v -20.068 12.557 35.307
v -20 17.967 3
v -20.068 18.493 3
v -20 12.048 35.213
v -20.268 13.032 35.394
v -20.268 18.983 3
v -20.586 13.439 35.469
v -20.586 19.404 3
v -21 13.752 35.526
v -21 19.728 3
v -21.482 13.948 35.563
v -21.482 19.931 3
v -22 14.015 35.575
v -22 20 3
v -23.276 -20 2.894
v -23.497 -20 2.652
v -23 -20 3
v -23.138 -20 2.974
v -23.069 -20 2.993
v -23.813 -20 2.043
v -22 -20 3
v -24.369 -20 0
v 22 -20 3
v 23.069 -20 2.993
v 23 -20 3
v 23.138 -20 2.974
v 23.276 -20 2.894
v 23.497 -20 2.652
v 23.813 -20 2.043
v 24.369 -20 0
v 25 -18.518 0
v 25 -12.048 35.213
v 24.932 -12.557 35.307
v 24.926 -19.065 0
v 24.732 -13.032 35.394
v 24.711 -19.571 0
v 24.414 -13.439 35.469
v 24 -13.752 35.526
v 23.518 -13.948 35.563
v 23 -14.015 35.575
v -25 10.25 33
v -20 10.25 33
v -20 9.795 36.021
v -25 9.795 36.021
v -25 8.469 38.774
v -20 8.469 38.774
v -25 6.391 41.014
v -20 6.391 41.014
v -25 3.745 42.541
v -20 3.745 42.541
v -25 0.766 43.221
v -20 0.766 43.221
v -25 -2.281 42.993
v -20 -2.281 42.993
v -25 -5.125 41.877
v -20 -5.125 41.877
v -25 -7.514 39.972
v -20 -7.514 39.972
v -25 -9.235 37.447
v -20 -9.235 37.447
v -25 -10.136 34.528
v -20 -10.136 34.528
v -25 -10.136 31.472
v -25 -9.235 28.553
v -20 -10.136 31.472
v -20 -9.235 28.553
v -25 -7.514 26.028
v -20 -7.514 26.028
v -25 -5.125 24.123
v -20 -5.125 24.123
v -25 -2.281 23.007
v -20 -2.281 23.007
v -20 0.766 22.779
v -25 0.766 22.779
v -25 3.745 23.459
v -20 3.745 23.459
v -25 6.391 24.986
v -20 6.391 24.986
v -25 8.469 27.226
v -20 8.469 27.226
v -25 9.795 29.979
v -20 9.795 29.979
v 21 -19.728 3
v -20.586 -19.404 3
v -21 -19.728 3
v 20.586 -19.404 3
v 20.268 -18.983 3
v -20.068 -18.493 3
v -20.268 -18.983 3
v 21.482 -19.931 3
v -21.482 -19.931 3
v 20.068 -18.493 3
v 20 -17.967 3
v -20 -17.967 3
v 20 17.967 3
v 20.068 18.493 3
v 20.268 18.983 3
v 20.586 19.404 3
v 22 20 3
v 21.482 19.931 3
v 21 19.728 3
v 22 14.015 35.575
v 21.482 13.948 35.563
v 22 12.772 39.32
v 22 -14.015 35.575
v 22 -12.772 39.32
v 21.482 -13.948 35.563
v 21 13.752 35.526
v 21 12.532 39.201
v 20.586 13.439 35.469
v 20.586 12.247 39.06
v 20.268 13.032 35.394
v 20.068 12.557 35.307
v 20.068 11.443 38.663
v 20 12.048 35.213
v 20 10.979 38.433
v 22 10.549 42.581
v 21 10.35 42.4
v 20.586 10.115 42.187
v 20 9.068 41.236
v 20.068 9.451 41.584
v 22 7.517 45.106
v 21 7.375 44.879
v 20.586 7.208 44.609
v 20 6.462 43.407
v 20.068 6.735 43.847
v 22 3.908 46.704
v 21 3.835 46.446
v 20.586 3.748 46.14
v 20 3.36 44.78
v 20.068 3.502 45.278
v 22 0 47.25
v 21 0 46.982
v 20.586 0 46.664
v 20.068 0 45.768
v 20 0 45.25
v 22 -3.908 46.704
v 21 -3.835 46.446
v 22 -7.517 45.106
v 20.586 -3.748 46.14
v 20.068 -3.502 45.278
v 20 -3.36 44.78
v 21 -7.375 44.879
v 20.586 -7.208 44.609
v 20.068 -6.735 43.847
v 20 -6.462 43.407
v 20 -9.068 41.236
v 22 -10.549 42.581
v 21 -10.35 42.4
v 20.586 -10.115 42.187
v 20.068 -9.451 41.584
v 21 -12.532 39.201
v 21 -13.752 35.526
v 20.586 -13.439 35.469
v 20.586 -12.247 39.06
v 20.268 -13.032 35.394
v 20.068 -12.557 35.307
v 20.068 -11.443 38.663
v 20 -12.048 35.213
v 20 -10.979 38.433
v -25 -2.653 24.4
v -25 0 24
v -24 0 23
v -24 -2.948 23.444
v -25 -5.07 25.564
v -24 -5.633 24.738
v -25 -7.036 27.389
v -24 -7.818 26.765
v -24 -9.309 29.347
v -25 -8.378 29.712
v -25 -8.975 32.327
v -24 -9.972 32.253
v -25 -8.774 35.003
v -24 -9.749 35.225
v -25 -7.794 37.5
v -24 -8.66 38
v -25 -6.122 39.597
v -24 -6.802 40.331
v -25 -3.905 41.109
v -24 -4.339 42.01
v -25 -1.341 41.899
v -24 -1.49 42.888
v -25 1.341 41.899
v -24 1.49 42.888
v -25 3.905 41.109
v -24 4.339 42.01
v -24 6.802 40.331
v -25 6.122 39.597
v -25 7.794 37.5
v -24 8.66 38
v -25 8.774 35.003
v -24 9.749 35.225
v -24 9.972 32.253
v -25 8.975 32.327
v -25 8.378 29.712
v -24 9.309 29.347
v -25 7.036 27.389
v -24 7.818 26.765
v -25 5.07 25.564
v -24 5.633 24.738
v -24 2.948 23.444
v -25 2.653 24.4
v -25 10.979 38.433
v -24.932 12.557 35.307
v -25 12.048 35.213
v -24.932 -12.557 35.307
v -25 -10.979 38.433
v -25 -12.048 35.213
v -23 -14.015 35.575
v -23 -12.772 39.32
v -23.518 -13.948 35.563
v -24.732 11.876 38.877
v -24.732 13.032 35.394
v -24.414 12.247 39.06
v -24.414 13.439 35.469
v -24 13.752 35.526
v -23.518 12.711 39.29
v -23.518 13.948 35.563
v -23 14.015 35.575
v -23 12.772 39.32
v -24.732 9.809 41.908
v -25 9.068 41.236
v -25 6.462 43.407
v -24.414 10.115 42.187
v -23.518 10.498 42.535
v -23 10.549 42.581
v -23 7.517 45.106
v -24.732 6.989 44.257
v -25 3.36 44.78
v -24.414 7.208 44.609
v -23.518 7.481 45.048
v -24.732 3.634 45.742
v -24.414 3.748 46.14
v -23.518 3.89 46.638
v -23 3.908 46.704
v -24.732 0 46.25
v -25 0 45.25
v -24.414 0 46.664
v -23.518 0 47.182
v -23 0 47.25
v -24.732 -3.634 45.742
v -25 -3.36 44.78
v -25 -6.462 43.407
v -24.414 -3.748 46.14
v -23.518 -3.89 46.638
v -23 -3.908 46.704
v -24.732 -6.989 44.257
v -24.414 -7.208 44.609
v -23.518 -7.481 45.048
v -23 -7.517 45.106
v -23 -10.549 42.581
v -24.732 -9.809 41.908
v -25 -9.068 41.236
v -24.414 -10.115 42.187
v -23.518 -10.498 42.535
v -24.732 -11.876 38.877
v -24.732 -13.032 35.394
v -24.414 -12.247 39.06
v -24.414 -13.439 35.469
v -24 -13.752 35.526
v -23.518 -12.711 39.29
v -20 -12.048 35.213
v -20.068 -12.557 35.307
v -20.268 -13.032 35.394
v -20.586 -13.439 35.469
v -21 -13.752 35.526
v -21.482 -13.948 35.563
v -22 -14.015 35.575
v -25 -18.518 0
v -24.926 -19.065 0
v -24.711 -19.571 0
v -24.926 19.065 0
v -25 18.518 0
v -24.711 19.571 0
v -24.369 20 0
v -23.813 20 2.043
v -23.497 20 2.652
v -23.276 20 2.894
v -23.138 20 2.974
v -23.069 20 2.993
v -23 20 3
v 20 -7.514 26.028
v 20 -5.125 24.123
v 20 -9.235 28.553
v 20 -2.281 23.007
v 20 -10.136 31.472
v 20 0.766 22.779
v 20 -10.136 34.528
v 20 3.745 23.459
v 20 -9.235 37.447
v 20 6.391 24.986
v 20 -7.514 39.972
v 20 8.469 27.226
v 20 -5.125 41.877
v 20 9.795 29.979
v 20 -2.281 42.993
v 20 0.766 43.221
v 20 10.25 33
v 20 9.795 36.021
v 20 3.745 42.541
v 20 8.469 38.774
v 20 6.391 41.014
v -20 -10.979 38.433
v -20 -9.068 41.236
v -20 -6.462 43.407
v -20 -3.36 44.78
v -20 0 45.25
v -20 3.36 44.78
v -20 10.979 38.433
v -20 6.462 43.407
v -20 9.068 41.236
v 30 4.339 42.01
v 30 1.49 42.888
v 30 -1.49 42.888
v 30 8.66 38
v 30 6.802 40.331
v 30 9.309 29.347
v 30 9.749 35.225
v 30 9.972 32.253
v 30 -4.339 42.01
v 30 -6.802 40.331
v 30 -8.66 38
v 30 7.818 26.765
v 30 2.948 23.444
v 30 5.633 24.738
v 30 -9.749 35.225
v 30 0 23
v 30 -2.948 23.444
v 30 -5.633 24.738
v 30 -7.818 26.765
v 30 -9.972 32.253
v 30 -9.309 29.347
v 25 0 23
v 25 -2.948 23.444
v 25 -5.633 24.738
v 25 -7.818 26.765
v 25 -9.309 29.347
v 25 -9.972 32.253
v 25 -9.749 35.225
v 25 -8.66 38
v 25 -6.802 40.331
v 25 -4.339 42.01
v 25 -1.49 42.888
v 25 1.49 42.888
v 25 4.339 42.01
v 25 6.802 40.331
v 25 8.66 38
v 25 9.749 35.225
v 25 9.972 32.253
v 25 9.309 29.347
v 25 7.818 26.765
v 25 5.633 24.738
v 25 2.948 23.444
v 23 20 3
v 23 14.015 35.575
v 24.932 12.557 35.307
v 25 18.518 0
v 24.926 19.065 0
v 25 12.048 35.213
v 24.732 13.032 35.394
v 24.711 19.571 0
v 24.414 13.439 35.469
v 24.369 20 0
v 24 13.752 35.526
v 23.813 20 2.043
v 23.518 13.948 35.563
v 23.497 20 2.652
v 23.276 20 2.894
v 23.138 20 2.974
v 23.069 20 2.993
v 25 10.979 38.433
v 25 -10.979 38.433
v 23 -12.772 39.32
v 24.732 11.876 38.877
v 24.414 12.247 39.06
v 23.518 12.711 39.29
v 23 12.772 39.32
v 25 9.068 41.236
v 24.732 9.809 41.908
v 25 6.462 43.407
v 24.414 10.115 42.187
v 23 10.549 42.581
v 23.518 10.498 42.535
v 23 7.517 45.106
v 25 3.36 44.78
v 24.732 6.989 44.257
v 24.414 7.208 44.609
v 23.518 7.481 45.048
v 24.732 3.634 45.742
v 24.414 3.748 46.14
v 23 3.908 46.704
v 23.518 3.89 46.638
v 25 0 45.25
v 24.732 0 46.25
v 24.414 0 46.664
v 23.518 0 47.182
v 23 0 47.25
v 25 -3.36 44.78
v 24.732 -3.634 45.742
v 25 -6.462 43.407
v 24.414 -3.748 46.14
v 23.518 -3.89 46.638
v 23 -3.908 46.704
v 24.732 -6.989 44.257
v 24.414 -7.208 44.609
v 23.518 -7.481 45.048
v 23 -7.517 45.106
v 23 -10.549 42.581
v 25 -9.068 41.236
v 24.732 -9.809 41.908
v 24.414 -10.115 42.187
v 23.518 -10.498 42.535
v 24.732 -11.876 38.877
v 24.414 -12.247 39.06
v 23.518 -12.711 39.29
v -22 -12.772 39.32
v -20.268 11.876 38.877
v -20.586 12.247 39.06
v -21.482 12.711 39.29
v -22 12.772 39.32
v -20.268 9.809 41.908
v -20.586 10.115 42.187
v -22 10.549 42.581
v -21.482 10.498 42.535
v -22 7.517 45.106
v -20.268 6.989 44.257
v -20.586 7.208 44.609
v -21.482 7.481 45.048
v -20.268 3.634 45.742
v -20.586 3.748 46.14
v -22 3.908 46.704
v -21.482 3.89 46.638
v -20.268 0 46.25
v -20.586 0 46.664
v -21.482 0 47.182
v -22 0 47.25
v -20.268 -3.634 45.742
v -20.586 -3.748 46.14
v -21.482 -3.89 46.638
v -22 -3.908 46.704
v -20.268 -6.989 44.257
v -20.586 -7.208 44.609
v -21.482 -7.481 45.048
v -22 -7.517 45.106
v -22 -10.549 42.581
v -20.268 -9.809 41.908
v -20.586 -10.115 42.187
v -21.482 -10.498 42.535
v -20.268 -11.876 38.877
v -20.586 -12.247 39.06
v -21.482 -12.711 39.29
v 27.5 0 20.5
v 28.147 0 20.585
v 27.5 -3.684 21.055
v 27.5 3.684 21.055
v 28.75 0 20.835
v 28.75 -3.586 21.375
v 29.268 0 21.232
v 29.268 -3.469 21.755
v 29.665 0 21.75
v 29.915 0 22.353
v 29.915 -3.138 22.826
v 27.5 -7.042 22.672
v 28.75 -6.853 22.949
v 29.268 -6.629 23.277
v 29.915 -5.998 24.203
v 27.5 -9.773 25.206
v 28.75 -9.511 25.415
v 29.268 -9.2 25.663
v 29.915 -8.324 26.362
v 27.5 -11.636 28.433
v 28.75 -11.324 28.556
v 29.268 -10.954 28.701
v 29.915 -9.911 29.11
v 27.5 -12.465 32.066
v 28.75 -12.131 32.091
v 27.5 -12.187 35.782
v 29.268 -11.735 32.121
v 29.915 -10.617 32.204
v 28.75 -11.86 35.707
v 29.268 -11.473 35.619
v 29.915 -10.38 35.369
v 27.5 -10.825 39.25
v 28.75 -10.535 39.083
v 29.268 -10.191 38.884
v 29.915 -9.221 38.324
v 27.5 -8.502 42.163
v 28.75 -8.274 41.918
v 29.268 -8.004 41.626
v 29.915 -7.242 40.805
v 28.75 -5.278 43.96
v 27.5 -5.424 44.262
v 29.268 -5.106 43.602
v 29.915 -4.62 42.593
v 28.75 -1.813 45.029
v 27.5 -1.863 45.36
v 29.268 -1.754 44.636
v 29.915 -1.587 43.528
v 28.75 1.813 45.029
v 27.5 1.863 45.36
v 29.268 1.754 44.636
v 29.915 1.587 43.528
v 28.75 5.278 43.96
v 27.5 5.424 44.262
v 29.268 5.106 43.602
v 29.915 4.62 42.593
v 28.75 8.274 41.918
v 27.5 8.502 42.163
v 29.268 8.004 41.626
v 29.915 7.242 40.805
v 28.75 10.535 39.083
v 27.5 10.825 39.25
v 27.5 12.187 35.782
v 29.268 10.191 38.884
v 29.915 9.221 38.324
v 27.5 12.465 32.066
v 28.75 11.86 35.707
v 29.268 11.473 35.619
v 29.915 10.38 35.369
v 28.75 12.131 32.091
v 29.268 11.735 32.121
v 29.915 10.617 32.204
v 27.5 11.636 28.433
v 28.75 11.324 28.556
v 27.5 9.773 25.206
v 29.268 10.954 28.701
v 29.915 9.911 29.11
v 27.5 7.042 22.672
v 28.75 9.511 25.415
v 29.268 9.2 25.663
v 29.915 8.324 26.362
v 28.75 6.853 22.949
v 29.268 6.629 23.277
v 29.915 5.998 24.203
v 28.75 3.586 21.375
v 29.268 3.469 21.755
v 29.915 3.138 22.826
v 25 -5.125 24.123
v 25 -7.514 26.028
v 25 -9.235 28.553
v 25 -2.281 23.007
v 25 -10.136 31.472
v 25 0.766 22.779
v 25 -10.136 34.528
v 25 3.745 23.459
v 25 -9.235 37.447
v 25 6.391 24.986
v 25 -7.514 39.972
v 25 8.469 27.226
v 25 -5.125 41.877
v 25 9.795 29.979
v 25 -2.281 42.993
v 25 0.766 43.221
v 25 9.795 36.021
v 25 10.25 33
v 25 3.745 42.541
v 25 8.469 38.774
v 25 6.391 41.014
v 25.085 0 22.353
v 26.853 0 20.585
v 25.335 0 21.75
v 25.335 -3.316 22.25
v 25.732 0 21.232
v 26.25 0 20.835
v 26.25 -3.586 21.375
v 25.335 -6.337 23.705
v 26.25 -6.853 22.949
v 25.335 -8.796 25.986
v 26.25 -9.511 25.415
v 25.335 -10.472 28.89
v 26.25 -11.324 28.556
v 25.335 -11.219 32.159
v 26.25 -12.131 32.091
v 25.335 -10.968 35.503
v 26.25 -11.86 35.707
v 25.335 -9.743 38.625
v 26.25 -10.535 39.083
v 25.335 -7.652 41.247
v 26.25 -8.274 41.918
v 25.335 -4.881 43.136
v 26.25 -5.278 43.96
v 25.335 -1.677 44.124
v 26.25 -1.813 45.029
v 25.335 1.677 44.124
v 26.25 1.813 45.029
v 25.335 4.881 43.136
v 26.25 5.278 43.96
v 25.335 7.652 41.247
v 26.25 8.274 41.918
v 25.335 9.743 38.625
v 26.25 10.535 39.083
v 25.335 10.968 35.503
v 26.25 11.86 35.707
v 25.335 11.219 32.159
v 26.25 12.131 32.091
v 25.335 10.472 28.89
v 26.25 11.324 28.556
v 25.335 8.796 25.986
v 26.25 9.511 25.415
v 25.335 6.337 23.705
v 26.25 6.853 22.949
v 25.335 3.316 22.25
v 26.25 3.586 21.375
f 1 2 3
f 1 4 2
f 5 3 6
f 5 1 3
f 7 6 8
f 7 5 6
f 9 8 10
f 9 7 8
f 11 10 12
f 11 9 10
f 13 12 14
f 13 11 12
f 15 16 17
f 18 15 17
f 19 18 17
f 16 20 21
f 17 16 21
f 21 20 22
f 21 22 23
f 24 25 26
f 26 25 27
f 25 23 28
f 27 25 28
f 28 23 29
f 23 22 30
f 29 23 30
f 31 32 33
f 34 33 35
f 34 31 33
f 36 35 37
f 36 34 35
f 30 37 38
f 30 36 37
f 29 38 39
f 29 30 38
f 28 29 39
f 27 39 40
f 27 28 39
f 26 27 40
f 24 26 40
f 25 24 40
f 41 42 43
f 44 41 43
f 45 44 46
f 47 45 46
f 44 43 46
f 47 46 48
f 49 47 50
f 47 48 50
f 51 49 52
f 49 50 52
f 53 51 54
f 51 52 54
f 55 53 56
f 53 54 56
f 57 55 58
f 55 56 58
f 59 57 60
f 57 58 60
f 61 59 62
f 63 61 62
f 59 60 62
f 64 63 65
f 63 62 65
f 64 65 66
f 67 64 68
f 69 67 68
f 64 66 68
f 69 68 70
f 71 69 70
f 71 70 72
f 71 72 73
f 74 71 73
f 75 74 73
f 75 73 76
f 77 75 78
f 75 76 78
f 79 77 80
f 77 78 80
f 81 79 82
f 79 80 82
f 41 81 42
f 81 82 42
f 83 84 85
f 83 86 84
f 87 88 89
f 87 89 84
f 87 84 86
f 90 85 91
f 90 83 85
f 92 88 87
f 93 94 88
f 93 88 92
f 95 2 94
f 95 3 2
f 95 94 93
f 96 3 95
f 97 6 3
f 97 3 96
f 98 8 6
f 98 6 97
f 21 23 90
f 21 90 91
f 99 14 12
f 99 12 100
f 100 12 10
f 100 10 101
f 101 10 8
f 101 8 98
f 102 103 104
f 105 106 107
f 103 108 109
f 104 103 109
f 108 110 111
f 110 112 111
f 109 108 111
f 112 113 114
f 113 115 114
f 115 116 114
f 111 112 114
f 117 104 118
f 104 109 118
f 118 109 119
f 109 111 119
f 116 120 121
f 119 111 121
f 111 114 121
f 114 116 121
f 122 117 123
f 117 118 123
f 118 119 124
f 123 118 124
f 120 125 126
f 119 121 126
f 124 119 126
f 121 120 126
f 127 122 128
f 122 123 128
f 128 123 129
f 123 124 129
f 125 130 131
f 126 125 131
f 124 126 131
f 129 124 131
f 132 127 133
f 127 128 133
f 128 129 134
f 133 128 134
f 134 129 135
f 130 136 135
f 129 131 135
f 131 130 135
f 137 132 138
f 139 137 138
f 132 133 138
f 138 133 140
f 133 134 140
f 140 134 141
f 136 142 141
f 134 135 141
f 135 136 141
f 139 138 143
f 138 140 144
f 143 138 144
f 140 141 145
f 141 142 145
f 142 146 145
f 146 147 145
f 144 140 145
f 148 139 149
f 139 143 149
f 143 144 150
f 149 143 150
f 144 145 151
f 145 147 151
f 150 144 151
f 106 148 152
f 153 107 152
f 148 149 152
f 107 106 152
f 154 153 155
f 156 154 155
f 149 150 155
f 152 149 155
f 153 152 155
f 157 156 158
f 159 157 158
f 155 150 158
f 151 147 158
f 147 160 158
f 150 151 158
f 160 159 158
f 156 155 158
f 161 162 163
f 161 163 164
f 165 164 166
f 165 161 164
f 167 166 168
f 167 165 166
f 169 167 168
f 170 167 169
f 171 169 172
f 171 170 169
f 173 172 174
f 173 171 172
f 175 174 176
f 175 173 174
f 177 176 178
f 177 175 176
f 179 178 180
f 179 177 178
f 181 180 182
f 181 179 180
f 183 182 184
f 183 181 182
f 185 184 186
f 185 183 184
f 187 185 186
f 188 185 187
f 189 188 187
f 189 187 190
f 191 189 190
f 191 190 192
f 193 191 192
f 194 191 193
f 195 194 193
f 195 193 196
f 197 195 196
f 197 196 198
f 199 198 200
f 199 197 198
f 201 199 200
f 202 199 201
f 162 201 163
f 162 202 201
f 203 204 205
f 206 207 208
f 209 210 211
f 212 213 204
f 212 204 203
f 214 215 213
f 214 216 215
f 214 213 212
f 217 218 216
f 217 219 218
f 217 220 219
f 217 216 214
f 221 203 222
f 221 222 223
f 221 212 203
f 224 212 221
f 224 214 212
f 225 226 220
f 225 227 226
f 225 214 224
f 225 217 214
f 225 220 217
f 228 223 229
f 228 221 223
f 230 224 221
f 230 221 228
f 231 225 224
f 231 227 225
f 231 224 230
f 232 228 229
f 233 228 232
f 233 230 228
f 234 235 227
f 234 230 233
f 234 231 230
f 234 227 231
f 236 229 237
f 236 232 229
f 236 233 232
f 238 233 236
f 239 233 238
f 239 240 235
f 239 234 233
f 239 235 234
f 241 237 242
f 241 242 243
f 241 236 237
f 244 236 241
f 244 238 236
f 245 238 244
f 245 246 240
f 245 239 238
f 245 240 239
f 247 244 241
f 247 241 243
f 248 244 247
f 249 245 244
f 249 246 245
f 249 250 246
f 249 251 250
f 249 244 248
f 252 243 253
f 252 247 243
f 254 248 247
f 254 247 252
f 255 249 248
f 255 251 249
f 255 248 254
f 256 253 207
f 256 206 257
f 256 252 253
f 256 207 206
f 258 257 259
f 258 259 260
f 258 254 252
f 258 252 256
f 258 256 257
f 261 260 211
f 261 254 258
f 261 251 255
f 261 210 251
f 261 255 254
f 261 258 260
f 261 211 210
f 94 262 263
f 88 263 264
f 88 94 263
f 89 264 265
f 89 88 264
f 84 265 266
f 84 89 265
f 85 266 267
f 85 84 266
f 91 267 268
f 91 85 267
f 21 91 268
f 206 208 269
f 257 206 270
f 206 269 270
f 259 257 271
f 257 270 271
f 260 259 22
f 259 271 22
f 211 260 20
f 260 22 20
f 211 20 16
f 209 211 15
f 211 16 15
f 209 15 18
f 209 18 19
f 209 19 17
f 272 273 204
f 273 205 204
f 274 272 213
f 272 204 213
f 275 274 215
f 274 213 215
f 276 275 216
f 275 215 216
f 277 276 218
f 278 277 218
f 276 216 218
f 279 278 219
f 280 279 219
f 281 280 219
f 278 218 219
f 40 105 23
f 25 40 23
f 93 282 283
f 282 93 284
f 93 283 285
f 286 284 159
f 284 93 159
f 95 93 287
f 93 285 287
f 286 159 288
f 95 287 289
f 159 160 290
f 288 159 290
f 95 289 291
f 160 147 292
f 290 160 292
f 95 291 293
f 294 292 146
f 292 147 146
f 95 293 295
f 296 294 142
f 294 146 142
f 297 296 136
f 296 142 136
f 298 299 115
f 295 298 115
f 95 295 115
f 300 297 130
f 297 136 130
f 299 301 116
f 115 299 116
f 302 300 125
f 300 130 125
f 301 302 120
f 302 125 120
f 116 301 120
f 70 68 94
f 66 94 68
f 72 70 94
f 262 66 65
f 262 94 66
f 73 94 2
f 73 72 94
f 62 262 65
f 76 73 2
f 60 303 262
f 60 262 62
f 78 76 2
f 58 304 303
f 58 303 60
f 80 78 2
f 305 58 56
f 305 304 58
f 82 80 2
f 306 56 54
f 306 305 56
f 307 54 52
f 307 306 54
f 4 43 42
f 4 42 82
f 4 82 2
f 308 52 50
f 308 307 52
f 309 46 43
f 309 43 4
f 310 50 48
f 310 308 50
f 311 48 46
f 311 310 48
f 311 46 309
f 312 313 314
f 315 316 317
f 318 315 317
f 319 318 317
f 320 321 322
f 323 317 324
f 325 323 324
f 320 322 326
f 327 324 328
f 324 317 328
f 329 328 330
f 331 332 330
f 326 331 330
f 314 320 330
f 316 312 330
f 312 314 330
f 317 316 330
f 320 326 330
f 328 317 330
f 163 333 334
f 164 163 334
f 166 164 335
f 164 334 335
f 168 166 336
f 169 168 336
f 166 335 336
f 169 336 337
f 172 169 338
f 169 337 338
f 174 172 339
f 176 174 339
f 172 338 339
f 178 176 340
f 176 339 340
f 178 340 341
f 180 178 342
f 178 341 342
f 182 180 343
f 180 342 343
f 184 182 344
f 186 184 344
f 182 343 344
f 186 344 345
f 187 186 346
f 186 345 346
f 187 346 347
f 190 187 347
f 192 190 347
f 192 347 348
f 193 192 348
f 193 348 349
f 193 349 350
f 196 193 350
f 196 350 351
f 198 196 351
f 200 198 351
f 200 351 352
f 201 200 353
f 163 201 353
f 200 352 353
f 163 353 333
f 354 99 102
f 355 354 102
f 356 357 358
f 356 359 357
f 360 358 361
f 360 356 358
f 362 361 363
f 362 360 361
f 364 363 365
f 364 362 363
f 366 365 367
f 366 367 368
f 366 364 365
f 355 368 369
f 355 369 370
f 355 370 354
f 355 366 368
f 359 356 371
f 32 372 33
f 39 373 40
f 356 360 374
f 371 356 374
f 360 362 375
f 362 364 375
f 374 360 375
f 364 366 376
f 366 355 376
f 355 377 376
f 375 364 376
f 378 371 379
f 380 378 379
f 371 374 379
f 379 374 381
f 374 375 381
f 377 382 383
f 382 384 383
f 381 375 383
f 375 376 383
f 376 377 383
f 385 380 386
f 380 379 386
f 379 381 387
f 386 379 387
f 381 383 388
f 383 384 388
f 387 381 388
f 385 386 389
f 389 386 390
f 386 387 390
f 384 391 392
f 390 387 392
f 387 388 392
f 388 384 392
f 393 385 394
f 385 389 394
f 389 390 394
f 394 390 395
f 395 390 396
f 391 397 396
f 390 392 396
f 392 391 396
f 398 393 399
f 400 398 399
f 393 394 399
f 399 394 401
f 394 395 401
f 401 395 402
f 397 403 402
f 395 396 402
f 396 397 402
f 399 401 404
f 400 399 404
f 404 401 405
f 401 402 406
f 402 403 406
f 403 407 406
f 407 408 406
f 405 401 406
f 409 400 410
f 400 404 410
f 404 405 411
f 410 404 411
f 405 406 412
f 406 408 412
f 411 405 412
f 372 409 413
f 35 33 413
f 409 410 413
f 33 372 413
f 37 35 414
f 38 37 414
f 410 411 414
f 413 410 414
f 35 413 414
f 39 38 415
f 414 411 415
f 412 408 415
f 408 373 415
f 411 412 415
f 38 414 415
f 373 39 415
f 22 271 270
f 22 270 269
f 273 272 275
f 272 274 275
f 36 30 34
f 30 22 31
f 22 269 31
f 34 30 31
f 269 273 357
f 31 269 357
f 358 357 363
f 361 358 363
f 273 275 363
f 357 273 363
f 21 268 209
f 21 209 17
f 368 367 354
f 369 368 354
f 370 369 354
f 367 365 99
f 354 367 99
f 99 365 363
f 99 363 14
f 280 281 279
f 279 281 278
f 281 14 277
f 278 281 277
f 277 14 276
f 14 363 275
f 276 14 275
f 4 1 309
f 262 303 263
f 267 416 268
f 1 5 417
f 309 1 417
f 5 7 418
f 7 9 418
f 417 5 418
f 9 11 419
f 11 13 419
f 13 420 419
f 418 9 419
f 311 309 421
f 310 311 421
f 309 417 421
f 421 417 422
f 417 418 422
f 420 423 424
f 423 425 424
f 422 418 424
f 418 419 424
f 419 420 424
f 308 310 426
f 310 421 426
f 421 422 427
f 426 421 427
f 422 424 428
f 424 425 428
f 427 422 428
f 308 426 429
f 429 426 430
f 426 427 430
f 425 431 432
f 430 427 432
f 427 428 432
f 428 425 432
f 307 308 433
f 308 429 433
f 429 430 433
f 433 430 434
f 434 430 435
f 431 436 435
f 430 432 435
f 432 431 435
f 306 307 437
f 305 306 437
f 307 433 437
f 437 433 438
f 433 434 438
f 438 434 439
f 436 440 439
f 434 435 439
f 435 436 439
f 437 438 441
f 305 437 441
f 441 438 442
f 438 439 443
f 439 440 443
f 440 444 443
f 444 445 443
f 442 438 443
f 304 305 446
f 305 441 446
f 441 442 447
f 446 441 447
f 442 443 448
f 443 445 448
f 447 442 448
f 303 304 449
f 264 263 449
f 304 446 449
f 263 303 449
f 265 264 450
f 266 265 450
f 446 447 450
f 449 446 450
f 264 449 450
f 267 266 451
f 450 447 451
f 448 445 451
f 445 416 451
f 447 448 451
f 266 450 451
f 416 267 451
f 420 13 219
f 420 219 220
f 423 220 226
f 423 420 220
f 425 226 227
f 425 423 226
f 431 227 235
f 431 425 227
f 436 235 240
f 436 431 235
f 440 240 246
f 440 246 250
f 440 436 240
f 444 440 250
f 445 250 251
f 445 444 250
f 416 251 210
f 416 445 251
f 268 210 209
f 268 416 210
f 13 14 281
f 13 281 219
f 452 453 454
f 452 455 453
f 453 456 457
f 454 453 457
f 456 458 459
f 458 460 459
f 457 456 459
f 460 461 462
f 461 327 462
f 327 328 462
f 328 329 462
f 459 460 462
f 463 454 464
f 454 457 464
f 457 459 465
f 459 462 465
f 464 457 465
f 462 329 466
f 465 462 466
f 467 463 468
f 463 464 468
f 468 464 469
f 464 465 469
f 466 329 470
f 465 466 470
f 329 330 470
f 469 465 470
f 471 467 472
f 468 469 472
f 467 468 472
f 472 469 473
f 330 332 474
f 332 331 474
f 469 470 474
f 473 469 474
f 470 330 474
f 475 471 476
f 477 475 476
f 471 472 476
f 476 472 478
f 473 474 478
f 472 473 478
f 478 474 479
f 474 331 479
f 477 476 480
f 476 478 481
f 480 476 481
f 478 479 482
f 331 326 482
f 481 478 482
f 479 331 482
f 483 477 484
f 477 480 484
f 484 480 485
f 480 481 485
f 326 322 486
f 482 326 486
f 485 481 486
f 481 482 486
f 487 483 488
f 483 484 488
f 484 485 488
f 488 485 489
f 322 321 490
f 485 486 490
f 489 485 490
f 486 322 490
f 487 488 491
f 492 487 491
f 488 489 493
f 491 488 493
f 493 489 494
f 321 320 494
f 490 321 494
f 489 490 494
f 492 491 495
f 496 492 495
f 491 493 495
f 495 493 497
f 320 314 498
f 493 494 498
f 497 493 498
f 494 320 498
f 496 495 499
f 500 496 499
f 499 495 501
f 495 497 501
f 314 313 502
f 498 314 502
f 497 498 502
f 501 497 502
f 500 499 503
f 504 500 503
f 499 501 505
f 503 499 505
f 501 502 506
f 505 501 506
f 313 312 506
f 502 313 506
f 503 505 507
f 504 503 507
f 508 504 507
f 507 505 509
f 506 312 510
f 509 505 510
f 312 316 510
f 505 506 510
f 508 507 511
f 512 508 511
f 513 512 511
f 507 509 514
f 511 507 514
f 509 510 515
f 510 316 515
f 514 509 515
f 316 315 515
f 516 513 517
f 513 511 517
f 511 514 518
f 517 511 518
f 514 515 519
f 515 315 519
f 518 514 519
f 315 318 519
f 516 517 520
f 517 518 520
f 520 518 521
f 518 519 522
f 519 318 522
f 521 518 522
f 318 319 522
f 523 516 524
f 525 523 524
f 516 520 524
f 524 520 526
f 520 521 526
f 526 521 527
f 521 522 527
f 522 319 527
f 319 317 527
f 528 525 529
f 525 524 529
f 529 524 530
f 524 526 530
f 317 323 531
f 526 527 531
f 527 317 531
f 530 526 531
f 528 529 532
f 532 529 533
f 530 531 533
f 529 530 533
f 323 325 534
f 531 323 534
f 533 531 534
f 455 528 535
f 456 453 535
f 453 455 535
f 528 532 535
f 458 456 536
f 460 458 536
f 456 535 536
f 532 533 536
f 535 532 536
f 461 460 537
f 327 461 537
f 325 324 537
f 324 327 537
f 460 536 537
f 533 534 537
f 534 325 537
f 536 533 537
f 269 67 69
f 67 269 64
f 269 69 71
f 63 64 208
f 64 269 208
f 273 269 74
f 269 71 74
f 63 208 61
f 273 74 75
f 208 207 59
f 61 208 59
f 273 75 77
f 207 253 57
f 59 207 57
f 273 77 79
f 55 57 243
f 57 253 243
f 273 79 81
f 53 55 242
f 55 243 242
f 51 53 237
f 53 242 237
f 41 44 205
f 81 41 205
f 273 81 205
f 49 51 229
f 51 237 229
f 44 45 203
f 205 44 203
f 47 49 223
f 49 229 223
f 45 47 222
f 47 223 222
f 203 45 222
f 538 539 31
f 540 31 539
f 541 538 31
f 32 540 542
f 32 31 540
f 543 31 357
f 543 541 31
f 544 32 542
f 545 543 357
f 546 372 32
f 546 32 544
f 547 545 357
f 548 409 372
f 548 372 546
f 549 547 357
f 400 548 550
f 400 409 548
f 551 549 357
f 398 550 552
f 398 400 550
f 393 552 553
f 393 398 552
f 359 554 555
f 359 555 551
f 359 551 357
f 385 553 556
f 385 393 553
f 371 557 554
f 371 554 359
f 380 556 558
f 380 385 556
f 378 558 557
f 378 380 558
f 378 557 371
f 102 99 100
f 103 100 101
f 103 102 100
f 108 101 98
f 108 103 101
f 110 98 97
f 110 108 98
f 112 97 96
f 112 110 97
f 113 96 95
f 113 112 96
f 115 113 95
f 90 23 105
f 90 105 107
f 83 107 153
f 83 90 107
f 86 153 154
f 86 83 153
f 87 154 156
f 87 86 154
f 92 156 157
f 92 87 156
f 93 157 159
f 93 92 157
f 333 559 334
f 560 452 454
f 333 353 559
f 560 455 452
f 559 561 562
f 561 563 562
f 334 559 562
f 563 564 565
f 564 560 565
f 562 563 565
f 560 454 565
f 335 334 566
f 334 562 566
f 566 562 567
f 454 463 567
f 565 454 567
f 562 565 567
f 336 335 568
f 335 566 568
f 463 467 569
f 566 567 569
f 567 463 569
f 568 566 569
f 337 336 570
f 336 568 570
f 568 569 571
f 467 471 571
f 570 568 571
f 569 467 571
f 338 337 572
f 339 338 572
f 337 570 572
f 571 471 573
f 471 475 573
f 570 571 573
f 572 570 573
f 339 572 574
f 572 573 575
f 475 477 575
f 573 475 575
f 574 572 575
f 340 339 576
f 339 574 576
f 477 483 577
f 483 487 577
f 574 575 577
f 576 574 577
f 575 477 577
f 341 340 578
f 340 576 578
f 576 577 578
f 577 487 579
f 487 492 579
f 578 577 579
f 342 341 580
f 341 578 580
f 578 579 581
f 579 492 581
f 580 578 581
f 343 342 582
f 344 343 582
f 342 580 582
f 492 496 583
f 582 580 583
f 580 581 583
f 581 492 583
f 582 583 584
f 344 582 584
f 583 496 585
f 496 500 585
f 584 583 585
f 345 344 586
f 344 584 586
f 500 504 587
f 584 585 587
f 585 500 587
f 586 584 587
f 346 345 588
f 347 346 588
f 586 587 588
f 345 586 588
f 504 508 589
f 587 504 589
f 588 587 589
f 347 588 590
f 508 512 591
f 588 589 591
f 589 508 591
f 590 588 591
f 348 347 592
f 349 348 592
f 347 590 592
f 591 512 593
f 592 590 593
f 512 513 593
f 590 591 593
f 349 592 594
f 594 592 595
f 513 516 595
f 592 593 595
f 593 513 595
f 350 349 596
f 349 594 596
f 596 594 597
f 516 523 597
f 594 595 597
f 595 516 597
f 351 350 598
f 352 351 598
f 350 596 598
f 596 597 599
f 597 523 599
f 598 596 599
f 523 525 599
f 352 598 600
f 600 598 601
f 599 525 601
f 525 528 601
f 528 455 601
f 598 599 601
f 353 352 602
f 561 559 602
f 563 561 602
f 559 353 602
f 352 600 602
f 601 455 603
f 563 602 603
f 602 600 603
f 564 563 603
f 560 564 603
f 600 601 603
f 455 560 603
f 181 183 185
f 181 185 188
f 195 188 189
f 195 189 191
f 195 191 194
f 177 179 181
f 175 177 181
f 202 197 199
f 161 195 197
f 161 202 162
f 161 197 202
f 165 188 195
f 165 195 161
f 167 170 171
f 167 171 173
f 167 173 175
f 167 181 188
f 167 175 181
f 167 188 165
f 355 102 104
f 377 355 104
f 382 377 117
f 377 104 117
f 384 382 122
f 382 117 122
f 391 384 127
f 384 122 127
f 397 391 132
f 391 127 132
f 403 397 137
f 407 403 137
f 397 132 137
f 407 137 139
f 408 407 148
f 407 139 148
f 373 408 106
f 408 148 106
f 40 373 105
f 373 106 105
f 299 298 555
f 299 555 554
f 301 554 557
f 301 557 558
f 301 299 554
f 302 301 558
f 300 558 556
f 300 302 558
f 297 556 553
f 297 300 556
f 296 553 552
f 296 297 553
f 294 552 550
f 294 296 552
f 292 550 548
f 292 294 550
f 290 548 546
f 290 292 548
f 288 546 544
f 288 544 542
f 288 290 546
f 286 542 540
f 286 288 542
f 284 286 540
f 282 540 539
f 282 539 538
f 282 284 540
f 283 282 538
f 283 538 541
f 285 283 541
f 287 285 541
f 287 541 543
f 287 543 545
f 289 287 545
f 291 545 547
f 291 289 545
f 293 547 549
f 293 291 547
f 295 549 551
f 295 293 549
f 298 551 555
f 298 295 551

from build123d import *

# Parameters (mm, degrees)
F0_W     = 40
F0_H     = 40
F0_W_2   = 5
F1_DEPTH = 3
F3_START = 20
F2_R     = 10.25
F3_DEPTH = 5
F4_START = -20
F4_DEPTH = 5
F5_W     = 50
F5_H     = 10
F7_R     = 2
F8_R     = 2.49999
F9_SIZE  = 1


# Not quite as in the source:
# - a fillet or chamfer is up to 0.001 mm smaller than in the source, because OpenCascade refuses the exact size


with BuildPart() as f1:
    # F0 (on Top) → F1 (new body)
    with BuildSketch(Plane.XY):
        Rectangle(F0_W, F0_H)
        with Locations((-22.5, 0)):
            Rectangle(F0_W_2, F0_H)
        with Locations((22.5, 0)):
            Rectangle(F0_W_2, F0_H)
    extrude(amount=F1_DEPTH)

    # F2 (on Right) → F3 (join)
    with BuildSketch(Plane.YZ.offset(F3_START)):
        with BuildLine():
            ThreePointArc((14.0154384668, 35.5748756445), (14.1912384617, 34.2927687049), (14.25, 33))
            ThreePointArc((14.25, 33), (-1.2927687049, 18.8087615383), (-14.0154384668, 35.5748756445))
            Line((-14.0154384668, 35.5748756445), (-20, 3))
            Line((-20, 3), (20, 3))
            Line((20, 3), (14.0154384668, 35.5748756445))
        make_face()
        with BuildLine():
            ThreePointArc((-14.0154384668, 35.5748756445), (-1.2927687049, 18.8087615383), (14.25, 33))
            ThreePointArc((14.25, 33), (14.1912384617, 34.2927687049), (14.0154384668, 35.5748756445))
            ThreePointArc((14.0154384668, 35.5748756445), (0, 47.25), (-14.0154384668, 35.5748756445))
        make_face()
        with Locations((0, 33)):
            Circle(F2_R, mode=Mode.SUBTRACT)
    extrude(amount=F3_DEPTH)

    # F2 (on Right) → F4 (join)
    with BuildSketch(Plane.YZ.offset(F4_START)):
        with BuildLine():
            ThreePointArc((14.0154384668, 35.5748756445), (14.1912384617, 34.2927687049), (14.25, 33))
            ThreePointArc((14.25, 33), (-1.2927687049, 18.8087615383), (-14.0154384668, 35.5748756445))
            Line((-14.0154384668, 35.5748756445), (-20, 3))
            Line((-20, 3), (20, 3))
            Line((20, 3), (14.0154384668, 35.5748756445))
        make_face()
        with BuildLine():
            ThreePointArc((-14.0154384668, 35.5748756445), (-1.2927687049, 18.8087615383), (14.25, 33))
            ThreePointArc((14.25, 33), (14.1912384617, 34.2927687049), (14.0154384668, 35.5748756445))
            ThreePointArc((14.0154384668, 35.5748756445), (0, 47.25), (-14.0154384668, 35.5748756445))
        make_face()
        with Locations((0, 33)):
            Circle(F2_R, mode=Mode.SUBTRACT)
    extrude(amount=-F4_DEPTH)

    # F7
    f7_edges = [f1.edges().sort_by_distance(p)[0] for p in [
        (-20, 17.007719, 19.287438),
        (-25, 17.007719, 19.287438),
        (20, 17.007719, 19.287438),
        (25, 17.007719, 19.287438),
    ]]
    fillet(f7_edges, radius=F7_R)


with BuildPart() as f6:
    # F5 (on Front) → F6 (revolve)
    with BuildSketch(Plane.XZ):
        with Locations((0, 28)):
            Rectangle(F5_W, F5_H)
        Polygon((25, 33), (25, 23), (25, 20.5), (30, 20.5), (30, 33), align=None)
    revolve(axis=Axis((0, 0, 33), (-1, 0, 0)))

    # F8 (radius 2.5 in the source; OpenCascade refuses exactly that, so slightly less here)
    f8_edges = [f6.edges().sort_by_distance(p)[0] for p in [
        (30, 0, 45.5),
        (25, 0, 45.5),
    ]]
    fillet(f8_edges, radius=F8_R)

    # F9
    f9_edges = [f6.edges().sort_by_distance(p)[0] for p in [
        (-25, 0, 43),
    ]]
    chamfer(f9_edges, length=F9_SIZE)


solid = Compound([f1.part, f6.part])
